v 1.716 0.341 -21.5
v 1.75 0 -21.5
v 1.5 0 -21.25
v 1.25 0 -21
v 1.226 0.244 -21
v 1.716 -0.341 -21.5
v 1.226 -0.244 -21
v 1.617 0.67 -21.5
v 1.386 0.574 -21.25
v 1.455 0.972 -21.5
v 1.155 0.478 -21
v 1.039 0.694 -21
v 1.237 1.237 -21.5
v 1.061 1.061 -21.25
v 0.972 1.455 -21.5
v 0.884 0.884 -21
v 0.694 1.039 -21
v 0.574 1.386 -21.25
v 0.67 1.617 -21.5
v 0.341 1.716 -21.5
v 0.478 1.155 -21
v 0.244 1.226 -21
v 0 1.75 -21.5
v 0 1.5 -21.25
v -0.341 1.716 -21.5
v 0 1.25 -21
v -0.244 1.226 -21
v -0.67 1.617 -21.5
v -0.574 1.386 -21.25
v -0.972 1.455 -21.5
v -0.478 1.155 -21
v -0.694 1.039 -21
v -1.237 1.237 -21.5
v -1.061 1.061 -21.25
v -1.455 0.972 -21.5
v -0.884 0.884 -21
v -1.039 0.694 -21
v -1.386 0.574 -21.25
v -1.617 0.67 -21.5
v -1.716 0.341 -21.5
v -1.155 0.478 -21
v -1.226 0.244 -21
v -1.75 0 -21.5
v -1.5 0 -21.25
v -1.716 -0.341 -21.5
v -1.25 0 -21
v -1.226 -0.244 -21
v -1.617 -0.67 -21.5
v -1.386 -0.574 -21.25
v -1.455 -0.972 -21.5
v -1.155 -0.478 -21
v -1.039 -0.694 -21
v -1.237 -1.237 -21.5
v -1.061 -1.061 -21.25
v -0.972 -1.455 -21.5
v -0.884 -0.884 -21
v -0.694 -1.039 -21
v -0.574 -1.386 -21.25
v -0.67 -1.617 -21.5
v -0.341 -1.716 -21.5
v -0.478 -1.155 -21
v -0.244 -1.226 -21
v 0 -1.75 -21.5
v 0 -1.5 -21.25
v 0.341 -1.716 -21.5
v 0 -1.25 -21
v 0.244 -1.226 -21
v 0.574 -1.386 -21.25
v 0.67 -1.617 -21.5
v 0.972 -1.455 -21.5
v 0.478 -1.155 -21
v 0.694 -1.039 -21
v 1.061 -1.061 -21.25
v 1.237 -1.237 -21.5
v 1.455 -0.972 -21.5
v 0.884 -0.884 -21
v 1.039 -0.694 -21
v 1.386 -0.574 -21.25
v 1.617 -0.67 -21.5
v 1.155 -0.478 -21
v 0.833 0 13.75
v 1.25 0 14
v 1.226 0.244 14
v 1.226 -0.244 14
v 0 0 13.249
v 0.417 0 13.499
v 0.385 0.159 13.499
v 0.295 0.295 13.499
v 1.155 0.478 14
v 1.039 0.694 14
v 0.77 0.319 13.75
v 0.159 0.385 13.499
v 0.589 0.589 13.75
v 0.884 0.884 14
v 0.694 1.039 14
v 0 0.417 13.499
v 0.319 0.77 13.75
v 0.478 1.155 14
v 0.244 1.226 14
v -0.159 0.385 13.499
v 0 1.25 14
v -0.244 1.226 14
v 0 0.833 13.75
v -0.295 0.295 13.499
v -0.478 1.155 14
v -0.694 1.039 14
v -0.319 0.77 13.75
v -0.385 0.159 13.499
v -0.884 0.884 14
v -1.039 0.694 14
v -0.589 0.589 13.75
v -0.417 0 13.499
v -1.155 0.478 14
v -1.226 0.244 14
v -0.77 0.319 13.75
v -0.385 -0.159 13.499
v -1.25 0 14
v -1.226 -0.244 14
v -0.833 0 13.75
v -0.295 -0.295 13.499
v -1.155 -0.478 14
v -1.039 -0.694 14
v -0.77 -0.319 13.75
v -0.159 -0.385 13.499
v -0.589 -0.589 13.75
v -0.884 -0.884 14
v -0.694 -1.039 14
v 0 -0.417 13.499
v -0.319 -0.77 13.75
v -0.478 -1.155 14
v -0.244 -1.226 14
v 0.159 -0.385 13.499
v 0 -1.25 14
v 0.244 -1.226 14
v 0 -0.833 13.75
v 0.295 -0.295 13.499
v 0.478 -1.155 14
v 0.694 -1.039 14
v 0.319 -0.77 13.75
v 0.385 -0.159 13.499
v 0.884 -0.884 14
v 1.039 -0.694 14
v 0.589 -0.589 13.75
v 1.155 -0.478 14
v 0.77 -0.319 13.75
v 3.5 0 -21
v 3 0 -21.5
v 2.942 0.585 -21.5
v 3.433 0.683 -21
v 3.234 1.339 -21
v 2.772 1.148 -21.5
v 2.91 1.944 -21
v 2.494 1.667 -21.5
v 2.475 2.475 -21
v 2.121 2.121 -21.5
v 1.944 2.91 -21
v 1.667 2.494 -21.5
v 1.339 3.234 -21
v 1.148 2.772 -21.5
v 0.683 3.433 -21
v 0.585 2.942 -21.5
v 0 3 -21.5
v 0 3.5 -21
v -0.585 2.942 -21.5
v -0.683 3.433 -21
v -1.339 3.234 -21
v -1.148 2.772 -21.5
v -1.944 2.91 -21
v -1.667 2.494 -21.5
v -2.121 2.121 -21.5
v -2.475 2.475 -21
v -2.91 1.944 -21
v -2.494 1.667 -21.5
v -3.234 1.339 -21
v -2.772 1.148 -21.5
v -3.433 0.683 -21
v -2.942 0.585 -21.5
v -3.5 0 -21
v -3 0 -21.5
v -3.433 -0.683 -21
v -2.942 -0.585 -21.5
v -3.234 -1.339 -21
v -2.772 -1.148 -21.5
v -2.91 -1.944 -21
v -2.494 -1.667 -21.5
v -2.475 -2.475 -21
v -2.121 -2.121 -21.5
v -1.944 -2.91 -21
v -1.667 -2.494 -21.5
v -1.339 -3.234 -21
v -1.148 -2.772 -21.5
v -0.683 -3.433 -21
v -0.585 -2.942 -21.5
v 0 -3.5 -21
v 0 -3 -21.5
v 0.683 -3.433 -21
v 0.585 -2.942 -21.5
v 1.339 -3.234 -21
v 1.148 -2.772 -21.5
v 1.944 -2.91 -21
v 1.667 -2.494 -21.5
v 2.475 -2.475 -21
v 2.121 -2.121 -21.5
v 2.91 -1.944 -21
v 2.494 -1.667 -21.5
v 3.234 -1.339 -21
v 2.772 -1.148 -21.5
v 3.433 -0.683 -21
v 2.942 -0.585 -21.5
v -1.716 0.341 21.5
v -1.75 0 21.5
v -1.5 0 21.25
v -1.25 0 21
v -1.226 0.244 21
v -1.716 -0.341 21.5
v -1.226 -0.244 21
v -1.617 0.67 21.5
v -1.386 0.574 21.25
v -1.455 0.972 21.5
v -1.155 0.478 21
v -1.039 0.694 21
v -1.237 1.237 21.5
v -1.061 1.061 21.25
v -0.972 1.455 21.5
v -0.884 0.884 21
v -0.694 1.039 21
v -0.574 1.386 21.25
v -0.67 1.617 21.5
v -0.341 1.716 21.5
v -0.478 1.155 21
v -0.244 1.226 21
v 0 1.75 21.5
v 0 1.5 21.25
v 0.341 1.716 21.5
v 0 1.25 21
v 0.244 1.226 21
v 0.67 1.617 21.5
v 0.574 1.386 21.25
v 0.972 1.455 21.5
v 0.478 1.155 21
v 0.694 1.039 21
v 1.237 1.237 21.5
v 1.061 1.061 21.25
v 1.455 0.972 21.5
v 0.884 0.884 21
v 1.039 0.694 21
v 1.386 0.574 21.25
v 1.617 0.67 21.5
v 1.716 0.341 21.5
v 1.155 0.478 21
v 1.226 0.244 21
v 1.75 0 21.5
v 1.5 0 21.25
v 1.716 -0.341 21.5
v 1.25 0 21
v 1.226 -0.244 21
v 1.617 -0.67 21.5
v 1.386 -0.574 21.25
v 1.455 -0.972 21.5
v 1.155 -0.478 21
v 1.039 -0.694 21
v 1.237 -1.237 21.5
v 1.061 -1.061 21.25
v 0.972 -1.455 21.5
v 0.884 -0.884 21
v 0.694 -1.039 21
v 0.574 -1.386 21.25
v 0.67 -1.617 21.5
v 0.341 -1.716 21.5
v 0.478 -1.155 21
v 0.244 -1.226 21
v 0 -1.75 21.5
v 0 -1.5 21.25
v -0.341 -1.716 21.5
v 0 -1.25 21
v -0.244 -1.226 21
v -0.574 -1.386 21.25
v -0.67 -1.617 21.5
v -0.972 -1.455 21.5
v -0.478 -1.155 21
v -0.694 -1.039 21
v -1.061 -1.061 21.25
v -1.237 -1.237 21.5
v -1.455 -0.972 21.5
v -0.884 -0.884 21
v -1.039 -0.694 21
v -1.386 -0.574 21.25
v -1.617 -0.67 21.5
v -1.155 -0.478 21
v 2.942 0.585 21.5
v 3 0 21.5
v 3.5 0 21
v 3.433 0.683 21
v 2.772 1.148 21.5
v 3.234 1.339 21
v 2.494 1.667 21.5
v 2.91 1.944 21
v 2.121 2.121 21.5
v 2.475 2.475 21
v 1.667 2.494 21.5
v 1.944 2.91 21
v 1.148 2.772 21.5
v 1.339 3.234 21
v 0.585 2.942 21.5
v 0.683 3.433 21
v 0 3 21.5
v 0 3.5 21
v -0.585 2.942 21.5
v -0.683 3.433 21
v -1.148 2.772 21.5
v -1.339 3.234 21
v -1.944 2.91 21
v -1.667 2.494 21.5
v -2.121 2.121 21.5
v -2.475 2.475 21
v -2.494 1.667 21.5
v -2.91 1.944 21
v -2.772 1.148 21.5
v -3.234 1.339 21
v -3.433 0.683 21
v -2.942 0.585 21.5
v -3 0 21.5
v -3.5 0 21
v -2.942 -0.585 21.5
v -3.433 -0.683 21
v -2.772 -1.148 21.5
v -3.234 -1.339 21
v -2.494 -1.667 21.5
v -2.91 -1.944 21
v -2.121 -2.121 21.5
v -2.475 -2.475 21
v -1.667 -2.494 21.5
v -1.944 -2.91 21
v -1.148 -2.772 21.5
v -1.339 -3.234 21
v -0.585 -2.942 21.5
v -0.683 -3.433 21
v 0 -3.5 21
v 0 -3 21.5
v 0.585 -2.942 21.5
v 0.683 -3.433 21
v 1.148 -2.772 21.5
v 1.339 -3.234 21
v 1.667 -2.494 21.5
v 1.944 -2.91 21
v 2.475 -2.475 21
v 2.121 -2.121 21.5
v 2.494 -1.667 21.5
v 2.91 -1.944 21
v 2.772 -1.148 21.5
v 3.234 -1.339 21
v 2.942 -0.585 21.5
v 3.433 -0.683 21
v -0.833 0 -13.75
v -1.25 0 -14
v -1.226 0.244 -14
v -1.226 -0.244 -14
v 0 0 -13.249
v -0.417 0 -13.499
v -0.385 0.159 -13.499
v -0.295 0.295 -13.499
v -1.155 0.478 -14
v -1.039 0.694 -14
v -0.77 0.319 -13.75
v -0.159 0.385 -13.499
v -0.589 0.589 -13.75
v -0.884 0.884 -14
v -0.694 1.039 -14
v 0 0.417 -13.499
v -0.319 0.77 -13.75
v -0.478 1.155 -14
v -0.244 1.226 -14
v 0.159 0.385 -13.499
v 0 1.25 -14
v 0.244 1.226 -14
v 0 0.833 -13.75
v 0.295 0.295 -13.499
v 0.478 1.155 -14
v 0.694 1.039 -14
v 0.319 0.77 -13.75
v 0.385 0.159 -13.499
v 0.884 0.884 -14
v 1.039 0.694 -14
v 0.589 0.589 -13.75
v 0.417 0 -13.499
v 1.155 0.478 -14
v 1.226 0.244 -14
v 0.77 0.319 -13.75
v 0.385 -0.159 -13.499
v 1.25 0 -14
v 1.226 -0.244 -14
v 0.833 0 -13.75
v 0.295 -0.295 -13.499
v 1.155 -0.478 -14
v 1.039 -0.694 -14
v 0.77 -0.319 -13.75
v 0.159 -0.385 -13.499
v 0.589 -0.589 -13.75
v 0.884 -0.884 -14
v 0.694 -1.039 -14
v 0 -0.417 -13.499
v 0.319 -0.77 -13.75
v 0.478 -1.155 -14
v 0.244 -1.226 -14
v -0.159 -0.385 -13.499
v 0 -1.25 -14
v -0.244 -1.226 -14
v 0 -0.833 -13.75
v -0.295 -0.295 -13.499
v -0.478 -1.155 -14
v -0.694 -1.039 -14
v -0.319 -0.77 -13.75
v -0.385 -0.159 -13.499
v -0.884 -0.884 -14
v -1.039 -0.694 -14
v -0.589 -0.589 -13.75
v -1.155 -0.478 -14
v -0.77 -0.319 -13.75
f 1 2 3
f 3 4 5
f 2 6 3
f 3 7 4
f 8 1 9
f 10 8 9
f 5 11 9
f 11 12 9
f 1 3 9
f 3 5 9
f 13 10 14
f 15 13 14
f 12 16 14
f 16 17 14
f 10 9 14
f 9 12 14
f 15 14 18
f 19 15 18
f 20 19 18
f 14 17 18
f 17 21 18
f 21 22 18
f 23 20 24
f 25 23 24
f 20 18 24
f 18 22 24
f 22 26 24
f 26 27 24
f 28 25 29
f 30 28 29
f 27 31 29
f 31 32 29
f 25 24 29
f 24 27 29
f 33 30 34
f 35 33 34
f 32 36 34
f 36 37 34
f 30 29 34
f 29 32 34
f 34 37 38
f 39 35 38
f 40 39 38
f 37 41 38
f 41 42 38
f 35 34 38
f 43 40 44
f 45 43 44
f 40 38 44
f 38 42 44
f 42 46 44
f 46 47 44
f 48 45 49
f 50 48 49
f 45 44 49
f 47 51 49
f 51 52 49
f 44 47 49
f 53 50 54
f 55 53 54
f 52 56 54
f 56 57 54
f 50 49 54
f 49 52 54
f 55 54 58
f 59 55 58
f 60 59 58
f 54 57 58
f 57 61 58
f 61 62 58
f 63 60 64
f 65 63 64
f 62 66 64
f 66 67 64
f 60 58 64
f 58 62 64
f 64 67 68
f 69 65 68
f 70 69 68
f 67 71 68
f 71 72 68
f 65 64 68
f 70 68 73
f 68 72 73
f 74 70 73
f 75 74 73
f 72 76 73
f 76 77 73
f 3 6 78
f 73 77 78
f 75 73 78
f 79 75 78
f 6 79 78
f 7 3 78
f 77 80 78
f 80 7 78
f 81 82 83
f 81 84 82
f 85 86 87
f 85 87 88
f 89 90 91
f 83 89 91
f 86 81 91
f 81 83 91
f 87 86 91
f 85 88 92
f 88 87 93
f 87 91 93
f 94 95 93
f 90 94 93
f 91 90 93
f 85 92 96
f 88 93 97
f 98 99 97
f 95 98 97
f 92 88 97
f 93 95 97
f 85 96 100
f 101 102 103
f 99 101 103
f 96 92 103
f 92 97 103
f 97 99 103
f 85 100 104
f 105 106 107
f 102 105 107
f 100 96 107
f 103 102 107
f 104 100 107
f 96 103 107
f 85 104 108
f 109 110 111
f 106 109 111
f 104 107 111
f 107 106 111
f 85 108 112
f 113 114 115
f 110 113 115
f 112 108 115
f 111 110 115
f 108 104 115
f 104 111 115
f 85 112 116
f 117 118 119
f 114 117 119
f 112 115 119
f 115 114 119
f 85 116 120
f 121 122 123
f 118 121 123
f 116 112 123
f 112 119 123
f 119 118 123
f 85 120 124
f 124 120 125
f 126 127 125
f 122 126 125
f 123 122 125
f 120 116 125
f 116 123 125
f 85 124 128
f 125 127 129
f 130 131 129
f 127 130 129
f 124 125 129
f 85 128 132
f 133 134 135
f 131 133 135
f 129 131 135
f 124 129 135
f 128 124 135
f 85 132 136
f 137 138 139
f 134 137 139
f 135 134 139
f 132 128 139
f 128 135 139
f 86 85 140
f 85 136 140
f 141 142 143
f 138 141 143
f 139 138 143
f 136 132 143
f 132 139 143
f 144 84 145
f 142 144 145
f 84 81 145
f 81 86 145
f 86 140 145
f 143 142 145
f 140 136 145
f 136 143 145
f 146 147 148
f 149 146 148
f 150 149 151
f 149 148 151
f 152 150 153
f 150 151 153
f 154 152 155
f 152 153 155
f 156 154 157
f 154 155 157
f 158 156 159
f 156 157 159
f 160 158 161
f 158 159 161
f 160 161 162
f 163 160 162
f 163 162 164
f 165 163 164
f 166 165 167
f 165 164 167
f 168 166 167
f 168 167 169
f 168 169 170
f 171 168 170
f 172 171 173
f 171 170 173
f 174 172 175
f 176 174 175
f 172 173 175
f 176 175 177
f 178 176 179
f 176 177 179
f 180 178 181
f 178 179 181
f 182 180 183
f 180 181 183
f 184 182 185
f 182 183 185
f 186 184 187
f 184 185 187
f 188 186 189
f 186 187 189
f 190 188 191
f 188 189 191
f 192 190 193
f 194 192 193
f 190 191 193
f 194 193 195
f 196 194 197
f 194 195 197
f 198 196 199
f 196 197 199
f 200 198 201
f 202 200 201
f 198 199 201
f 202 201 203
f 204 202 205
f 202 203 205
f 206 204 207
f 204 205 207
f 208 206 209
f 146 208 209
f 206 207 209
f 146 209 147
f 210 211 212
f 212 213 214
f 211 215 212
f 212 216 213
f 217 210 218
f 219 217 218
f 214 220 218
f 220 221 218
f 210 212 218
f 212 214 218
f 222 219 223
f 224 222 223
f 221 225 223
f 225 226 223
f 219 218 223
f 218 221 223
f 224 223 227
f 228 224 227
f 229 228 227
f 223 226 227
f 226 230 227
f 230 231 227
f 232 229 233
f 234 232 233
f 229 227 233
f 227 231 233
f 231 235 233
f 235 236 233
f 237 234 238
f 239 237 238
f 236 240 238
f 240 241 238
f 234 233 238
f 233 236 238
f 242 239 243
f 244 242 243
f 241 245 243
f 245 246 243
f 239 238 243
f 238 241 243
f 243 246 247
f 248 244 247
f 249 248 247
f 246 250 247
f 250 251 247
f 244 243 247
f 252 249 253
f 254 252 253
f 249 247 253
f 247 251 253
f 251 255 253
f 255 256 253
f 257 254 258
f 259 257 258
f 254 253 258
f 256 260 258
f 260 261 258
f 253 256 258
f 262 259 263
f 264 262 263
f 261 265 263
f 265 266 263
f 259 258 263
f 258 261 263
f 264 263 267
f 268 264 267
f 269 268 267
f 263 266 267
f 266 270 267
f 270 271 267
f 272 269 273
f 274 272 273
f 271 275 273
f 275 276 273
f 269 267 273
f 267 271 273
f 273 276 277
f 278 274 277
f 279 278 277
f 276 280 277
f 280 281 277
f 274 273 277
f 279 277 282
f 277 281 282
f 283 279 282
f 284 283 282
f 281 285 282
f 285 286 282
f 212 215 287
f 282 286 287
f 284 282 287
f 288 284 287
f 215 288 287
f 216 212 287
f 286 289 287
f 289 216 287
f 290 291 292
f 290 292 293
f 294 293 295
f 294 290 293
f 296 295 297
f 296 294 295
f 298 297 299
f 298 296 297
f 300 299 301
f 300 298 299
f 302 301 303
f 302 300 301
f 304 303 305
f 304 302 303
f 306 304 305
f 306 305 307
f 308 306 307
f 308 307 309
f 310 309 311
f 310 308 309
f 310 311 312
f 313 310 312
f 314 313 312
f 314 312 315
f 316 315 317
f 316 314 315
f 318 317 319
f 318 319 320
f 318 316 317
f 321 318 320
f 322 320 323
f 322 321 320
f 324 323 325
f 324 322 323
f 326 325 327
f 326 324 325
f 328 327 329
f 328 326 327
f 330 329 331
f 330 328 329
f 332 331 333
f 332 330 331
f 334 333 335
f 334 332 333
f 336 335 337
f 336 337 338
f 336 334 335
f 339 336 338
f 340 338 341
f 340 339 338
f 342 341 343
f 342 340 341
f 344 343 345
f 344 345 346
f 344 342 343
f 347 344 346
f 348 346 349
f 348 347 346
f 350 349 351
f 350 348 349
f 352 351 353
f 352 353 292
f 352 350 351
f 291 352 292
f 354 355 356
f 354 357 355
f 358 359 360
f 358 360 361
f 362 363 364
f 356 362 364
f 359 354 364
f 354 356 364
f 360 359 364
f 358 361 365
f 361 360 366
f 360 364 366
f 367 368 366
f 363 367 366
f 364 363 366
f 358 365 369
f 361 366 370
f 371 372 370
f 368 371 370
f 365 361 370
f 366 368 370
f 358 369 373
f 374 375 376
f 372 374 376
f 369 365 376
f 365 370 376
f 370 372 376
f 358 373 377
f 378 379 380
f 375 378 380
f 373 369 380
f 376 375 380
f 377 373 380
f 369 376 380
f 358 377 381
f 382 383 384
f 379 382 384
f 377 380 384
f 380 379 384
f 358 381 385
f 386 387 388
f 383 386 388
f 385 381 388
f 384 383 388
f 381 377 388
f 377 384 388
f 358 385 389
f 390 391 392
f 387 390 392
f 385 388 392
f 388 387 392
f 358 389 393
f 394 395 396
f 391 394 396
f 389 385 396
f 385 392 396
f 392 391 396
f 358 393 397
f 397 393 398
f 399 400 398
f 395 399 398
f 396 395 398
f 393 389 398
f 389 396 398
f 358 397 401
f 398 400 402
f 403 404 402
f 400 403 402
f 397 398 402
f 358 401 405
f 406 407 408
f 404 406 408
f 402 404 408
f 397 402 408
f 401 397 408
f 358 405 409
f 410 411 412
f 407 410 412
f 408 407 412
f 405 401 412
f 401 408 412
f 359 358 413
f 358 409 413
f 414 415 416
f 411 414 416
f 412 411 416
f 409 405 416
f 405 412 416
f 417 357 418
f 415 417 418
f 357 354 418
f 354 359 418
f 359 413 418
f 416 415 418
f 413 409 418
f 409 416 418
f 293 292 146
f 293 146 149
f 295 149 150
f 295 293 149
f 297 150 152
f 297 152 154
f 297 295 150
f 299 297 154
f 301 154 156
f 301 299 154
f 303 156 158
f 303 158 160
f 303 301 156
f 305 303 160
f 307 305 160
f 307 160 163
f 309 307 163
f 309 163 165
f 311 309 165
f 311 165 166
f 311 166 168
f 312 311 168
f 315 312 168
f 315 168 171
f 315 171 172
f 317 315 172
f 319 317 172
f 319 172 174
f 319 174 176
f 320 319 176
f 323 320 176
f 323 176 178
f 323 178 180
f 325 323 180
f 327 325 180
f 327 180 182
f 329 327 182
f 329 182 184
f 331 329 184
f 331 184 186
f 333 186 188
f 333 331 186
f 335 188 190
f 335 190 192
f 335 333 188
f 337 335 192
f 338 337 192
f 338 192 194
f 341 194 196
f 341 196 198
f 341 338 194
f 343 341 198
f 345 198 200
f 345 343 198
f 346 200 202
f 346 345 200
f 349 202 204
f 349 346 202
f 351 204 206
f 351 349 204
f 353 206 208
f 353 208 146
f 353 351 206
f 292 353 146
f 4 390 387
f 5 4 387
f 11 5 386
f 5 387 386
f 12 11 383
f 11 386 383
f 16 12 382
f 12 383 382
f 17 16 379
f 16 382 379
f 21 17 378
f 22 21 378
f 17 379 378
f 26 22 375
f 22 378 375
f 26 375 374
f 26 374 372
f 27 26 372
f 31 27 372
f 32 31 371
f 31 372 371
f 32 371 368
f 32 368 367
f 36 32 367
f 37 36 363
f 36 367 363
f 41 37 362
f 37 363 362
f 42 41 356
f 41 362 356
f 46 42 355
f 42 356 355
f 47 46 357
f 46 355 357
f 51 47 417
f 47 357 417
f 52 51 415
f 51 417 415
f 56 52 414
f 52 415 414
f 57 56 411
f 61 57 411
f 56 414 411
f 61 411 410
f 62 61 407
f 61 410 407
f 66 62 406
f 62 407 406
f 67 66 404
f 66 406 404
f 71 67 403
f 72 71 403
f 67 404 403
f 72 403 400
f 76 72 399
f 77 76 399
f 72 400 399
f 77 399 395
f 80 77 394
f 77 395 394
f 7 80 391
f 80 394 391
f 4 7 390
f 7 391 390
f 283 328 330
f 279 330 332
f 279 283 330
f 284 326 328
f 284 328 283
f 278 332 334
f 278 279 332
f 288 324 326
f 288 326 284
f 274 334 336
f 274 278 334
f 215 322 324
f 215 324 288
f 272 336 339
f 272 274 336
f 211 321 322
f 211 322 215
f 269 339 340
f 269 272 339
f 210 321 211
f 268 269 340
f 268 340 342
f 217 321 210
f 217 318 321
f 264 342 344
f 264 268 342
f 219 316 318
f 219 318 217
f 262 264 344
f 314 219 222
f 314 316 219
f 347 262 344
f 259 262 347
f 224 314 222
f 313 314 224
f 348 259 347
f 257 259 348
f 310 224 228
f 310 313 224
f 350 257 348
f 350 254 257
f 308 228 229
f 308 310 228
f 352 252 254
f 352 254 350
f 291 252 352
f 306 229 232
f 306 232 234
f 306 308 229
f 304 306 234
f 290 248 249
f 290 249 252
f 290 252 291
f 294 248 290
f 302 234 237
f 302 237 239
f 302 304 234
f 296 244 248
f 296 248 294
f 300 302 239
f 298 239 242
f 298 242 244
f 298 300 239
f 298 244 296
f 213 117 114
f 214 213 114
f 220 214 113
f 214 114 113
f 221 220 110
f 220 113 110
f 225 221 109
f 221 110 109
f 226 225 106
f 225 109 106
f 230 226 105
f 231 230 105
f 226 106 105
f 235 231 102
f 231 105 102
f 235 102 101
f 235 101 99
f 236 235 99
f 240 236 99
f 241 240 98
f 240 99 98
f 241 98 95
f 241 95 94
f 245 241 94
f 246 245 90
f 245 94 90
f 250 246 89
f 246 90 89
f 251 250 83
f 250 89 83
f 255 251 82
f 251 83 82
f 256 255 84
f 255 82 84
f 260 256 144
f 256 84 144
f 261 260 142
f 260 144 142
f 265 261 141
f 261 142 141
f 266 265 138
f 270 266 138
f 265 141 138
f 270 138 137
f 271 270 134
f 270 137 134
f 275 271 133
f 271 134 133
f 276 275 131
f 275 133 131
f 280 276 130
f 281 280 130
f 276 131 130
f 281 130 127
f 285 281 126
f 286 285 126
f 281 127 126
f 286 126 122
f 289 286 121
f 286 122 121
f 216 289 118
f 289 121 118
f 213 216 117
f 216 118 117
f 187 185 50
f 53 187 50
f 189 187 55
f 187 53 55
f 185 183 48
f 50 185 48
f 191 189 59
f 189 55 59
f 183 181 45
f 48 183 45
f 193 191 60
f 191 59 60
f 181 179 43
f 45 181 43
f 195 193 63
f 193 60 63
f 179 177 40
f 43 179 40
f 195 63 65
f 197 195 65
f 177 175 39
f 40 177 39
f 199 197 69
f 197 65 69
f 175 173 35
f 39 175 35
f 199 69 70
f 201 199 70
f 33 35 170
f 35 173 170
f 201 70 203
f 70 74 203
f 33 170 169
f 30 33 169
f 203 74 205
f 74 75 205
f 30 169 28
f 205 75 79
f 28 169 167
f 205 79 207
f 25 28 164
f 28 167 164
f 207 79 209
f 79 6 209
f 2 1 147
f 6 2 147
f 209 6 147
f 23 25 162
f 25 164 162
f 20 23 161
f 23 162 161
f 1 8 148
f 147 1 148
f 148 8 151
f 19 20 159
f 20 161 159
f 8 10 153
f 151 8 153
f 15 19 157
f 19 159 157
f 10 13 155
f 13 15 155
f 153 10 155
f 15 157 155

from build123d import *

# Parameters (mm, degrees)
SKETCH_1_R                       = 3.5
EXTRUDE_1_DEPTH                  = 21.5
HOLE_WIZARD_M3_1_D               = 2.5
HOLE_WIZARD_M3_1_DEPTH           = 7.5
HOLE_WIZARD_M3_1_TIP             = 0.751075774
HOLE_WIZARD_M3_1_ON_FACE_2_D     = 2.5
HOLE_WIZARD_M3_1_ON_FACE_2_DEPTH = 7.5
HOLE_WIZARD_M3_1_ON_FACE_2_TIP   = 0.751075774
CHAMFER_1_SIZE                   = 0.5


with BuildPart() as part:
    # 草图1 → 拉伸1 (new, symmetric)
    with BuildSketch(Plane.XY):
        Circle(SKETCH_1_R)
    extrude(amount=EXTRUDE_1_DEPTH, both=True)

    # M3 螺纹孔1
    with Locations(Plane.XY.offset(21.5)):
        with Locations((0, 0)):
            Hole(HOLE_WIZARD_M3_1_D / 2, depth=HOLE_WIZARD_M3_1_DEPTH)
            with Locations((0, 0, -(HOLE_WIZARD_M3_1_DEPTH + HOLE_WIZARD_M3_1_TIP / 2))):  # 118° drill point
                Cone(0, HOLE_WIZARD_M3_1_D / 2, HOLE_WIZARD_M3_1_TIP, mode=Mode.SUBTRACT)

    # M3 螺纹孔1 on face 2
    with Locations(Plane(origin=(0, 0, -21.5), x_dir=(-1, 0, 0), z_dir=(0, 0, -1))):
        with Locations((0, 0)):
            Hole(HOLE_WIZARD_M3_1_ON_FACE_2_D / 2, depth=HOLE_WIZARD_M3_1_ON_FACE_2_DEPTH)
            with Locations((0, 0, -(HOLE_WIZARD_M3_1_ON_FACE_2_DEPTH + HOLE_WIZARD_M3_1_ON_FACE_2_TIP / 2))):  # 118° drill point
                Cone(0, HOLE_WIZARD_M3_1_ON_FACE_2_D / 2, HOLE_WIZARD_M3_1_ON_FACE_2_TIP, mode=Mode.SUBTRACT)

    # 倒角1
    chamfer_1_edges = [part.edges().sort_by_distance(p)[0] for p in [
        (-3.5, 0, -21.5),
        (-3.5, 0, 21.5),
        (-1.25, 0, -21.5),
        (1.25, 0, 21.5),
    ]]
    chamfer(chamfer_1_edges, length=CHAMFER_1_SIZE)


solid = part.part
